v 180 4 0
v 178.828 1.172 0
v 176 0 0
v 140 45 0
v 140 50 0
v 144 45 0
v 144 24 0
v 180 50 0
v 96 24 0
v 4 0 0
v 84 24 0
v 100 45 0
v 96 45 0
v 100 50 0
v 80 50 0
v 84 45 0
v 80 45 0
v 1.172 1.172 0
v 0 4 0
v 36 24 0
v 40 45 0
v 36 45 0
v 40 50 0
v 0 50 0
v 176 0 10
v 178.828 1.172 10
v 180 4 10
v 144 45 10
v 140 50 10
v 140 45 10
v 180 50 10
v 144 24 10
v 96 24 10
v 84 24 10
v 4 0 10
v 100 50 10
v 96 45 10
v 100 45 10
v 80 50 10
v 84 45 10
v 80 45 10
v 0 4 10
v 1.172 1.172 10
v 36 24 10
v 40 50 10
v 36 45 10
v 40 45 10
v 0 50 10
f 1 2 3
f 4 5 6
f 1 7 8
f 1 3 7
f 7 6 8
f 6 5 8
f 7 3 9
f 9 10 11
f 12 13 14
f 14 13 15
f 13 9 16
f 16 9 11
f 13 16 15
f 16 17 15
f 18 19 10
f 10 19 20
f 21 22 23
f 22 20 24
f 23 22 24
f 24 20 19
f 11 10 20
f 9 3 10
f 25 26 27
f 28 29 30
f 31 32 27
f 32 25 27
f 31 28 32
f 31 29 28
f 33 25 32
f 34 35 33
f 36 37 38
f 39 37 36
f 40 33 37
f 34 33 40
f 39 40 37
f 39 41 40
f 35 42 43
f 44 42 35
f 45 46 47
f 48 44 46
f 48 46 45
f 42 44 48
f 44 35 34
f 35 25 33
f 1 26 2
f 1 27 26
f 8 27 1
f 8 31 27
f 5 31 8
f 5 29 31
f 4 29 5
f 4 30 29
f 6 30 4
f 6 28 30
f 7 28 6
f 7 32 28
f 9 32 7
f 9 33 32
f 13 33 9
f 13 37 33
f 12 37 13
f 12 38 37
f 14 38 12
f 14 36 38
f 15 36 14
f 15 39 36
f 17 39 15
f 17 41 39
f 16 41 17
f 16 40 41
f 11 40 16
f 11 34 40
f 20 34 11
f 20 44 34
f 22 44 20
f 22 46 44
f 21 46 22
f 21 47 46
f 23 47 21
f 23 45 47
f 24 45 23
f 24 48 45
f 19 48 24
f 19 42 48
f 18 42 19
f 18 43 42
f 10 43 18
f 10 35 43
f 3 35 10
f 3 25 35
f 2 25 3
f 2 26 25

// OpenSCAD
$fn = 32;

// ----------------------------------------------------------------------
// Oversize slot bar: 180 mm bar with 2 oversize windows
// ----------------------------------------------------------------------

// --- parameters (mm) ---
profile_height = 10;      // extrusion height
profile_points = 24;      // points of the closed outline

profile = [[0, 4], [1.172, 1.172], [4, 0], [176, 0], [178.828, 1.172], [180, 4], [180, 50], [140, 50], [140, 45], [144, 45], [144, 24], [96, 24], [96, 45], [100, 45], [100, 50], [80, 50], [80, 45], [84, 45], [84, 24], [36, 24], [36, 45], [40, 45], [40, 50], [0, 50]];  // single closed polygon, 24 points, counter clockwise

// --- the one profile operation ---
linear_extrude(height = profile_height) polygon(points = profile);
